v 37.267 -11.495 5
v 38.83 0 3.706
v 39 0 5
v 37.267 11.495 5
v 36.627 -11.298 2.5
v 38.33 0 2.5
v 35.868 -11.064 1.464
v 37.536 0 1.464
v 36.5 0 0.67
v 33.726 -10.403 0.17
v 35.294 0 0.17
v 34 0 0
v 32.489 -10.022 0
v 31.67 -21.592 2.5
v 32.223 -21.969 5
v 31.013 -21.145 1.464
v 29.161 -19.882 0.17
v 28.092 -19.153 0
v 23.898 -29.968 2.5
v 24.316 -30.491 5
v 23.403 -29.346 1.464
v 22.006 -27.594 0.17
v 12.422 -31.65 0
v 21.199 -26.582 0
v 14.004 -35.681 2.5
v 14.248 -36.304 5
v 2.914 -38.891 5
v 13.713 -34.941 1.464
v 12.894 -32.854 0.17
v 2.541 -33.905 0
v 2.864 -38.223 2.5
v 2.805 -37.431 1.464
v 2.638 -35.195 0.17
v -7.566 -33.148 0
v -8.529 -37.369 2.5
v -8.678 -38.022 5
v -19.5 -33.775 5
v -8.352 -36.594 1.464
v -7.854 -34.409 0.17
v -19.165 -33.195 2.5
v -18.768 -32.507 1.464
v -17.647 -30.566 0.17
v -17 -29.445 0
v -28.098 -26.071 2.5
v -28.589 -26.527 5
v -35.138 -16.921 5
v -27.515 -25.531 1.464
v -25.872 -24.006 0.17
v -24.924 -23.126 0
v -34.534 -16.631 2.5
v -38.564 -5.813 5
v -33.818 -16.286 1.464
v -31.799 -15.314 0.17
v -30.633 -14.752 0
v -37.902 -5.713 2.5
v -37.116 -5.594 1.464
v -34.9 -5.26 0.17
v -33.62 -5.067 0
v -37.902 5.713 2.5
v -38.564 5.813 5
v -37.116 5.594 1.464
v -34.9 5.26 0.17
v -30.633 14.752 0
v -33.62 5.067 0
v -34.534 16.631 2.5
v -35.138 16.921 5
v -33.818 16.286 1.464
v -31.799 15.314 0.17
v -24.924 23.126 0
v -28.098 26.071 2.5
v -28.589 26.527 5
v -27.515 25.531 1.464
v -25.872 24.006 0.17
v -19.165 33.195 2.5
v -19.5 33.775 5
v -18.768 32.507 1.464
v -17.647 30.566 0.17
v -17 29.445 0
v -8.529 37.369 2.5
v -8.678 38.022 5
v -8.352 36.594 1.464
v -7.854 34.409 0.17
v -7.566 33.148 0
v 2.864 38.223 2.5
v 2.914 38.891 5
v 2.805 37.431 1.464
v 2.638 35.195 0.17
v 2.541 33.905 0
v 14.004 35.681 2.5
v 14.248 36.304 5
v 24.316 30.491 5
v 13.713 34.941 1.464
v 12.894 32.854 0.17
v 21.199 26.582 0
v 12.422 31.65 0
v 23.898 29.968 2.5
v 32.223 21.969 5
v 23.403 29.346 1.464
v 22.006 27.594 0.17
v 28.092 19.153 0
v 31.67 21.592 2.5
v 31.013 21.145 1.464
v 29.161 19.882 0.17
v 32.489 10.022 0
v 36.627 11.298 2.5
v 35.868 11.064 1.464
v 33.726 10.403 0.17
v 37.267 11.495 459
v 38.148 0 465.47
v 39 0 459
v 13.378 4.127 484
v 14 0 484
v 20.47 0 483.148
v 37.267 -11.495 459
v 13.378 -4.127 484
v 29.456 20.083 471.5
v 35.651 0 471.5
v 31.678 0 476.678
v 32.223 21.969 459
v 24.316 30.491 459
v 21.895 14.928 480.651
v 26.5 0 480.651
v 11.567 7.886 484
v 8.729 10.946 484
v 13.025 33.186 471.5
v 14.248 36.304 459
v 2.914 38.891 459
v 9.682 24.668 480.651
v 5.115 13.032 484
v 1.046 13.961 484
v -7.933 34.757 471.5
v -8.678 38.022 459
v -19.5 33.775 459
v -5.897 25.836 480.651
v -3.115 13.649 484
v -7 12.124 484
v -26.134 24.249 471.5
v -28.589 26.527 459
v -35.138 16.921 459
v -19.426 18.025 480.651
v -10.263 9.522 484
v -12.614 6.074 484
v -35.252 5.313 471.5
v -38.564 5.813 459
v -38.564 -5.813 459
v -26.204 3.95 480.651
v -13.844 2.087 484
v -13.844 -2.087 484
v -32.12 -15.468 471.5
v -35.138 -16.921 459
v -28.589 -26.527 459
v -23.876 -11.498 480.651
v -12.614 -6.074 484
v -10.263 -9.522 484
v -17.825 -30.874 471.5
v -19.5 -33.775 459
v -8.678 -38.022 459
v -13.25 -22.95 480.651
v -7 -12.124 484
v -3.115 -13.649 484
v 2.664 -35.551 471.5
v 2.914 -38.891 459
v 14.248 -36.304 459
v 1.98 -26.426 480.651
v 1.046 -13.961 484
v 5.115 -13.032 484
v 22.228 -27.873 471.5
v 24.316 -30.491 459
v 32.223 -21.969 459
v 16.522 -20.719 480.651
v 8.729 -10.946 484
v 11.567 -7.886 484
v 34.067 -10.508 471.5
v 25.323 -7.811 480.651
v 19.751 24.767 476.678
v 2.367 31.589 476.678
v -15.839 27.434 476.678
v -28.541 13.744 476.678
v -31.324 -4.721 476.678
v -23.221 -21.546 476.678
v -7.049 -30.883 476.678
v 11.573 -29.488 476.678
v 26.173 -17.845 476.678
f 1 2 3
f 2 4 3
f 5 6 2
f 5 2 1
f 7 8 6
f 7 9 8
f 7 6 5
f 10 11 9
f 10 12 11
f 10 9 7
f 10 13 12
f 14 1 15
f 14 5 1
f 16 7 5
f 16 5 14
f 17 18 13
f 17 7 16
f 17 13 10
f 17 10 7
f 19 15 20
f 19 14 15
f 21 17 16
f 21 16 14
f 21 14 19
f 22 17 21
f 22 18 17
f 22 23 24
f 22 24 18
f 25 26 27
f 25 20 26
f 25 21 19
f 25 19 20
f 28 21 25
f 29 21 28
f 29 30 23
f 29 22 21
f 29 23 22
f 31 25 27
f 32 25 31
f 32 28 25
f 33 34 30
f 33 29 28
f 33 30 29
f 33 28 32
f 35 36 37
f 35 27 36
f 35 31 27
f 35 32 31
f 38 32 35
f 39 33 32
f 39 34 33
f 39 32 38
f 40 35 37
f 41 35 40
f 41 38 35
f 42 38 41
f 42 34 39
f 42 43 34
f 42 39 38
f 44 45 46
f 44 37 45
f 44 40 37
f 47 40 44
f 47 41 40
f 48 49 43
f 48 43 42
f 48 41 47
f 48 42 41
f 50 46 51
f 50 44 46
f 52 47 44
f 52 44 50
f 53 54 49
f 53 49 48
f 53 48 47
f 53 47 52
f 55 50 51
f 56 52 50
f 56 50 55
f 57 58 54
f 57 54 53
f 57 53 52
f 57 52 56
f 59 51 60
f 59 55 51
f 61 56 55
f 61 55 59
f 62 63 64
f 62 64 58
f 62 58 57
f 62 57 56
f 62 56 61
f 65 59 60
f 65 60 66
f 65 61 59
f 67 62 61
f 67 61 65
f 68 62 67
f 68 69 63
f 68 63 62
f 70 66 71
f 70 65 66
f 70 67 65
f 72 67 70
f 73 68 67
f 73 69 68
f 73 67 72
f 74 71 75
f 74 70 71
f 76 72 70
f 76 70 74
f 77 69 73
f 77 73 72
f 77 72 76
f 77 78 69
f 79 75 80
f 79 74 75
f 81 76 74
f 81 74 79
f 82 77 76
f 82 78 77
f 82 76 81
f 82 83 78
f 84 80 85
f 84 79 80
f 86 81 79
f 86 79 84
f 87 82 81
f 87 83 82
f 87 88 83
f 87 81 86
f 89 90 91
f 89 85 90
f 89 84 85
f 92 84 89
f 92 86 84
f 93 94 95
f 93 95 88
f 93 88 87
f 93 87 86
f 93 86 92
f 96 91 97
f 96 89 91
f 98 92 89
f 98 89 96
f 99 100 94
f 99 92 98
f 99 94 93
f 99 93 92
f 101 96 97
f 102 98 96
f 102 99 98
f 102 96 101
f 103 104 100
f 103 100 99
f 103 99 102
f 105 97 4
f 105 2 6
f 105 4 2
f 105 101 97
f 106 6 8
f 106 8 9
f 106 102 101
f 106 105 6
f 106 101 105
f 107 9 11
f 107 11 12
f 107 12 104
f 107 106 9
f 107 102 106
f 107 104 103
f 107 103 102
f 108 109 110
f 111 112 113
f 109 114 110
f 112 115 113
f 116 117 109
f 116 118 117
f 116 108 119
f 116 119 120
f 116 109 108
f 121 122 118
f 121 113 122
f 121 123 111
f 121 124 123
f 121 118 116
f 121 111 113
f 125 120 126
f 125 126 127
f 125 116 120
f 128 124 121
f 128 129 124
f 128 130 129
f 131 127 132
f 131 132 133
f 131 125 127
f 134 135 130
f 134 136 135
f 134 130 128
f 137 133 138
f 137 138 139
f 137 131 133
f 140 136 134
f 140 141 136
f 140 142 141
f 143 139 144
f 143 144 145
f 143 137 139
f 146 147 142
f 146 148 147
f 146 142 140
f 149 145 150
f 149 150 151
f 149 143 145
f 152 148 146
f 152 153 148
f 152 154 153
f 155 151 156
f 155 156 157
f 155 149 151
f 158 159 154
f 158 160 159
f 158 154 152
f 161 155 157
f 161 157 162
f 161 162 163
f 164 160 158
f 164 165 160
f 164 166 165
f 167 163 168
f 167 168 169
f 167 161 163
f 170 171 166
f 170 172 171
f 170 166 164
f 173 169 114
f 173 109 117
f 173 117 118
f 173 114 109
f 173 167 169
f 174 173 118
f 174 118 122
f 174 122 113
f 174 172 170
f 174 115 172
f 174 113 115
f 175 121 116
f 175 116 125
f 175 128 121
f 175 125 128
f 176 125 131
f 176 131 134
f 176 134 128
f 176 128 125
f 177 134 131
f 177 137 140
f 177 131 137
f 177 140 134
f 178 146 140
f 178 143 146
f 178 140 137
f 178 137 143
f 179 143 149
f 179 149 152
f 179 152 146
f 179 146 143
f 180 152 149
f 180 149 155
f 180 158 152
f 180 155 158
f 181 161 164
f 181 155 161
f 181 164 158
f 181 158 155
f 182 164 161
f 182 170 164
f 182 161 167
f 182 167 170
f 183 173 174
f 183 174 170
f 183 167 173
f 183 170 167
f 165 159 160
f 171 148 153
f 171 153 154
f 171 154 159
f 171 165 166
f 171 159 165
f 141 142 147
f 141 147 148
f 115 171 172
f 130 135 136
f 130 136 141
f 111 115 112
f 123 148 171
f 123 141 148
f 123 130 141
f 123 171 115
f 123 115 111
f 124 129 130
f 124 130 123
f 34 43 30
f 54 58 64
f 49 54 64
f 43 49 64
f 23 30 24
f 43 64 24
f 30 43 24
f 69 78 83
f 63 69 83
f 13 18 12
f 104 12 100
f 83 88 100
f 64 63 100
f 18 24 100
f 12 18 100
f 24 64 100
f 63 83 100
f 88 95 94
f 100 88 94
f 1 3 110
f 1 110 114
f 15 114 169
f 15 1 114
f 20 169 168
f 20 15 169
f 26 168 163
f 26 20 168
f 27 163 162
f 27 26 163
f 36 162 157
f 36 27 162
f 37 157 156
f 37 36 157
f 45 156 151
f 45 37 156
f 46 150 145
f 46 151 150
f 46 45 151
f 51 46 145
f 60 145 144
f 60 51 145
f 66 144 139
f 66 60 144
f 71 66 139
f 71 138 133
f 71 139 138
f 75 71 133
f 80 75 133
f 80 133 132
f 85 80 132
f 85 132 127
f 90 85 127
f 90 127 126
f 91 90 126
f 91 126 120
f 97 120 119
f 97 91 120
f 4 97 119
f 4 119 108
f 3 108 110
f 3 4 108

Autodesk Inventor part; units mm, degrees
ref_plane "YZ Plane" through (0, 0, 0) normal (1, 0, 0) x (0, 1, 0)
ref_plane "XZ Plane" through (0, 0, 0) normal (0, 1, 0) x (-1, 0, 0)
ref_plane "XY Plane" through (0, 0, 0) normal (0, 0, 1) x (1, 0, 0)
sketch "Sketch1" plane through (0, 0, 0) normal (0, 0, 1) x (1, 0, 0)
  circle A0 centre (0, 0) radius 39
  dimension "d0" = 78
extrude "Extrusion1" add sketch "Sketch1" along normal blind 484
fillet "Fillet1" radius 25 1 edges at (-39, 0, 484)
fillet "Fillet4" radius 5 1 edges at (-39, 0, 0)
properties part number "Accumulator"
